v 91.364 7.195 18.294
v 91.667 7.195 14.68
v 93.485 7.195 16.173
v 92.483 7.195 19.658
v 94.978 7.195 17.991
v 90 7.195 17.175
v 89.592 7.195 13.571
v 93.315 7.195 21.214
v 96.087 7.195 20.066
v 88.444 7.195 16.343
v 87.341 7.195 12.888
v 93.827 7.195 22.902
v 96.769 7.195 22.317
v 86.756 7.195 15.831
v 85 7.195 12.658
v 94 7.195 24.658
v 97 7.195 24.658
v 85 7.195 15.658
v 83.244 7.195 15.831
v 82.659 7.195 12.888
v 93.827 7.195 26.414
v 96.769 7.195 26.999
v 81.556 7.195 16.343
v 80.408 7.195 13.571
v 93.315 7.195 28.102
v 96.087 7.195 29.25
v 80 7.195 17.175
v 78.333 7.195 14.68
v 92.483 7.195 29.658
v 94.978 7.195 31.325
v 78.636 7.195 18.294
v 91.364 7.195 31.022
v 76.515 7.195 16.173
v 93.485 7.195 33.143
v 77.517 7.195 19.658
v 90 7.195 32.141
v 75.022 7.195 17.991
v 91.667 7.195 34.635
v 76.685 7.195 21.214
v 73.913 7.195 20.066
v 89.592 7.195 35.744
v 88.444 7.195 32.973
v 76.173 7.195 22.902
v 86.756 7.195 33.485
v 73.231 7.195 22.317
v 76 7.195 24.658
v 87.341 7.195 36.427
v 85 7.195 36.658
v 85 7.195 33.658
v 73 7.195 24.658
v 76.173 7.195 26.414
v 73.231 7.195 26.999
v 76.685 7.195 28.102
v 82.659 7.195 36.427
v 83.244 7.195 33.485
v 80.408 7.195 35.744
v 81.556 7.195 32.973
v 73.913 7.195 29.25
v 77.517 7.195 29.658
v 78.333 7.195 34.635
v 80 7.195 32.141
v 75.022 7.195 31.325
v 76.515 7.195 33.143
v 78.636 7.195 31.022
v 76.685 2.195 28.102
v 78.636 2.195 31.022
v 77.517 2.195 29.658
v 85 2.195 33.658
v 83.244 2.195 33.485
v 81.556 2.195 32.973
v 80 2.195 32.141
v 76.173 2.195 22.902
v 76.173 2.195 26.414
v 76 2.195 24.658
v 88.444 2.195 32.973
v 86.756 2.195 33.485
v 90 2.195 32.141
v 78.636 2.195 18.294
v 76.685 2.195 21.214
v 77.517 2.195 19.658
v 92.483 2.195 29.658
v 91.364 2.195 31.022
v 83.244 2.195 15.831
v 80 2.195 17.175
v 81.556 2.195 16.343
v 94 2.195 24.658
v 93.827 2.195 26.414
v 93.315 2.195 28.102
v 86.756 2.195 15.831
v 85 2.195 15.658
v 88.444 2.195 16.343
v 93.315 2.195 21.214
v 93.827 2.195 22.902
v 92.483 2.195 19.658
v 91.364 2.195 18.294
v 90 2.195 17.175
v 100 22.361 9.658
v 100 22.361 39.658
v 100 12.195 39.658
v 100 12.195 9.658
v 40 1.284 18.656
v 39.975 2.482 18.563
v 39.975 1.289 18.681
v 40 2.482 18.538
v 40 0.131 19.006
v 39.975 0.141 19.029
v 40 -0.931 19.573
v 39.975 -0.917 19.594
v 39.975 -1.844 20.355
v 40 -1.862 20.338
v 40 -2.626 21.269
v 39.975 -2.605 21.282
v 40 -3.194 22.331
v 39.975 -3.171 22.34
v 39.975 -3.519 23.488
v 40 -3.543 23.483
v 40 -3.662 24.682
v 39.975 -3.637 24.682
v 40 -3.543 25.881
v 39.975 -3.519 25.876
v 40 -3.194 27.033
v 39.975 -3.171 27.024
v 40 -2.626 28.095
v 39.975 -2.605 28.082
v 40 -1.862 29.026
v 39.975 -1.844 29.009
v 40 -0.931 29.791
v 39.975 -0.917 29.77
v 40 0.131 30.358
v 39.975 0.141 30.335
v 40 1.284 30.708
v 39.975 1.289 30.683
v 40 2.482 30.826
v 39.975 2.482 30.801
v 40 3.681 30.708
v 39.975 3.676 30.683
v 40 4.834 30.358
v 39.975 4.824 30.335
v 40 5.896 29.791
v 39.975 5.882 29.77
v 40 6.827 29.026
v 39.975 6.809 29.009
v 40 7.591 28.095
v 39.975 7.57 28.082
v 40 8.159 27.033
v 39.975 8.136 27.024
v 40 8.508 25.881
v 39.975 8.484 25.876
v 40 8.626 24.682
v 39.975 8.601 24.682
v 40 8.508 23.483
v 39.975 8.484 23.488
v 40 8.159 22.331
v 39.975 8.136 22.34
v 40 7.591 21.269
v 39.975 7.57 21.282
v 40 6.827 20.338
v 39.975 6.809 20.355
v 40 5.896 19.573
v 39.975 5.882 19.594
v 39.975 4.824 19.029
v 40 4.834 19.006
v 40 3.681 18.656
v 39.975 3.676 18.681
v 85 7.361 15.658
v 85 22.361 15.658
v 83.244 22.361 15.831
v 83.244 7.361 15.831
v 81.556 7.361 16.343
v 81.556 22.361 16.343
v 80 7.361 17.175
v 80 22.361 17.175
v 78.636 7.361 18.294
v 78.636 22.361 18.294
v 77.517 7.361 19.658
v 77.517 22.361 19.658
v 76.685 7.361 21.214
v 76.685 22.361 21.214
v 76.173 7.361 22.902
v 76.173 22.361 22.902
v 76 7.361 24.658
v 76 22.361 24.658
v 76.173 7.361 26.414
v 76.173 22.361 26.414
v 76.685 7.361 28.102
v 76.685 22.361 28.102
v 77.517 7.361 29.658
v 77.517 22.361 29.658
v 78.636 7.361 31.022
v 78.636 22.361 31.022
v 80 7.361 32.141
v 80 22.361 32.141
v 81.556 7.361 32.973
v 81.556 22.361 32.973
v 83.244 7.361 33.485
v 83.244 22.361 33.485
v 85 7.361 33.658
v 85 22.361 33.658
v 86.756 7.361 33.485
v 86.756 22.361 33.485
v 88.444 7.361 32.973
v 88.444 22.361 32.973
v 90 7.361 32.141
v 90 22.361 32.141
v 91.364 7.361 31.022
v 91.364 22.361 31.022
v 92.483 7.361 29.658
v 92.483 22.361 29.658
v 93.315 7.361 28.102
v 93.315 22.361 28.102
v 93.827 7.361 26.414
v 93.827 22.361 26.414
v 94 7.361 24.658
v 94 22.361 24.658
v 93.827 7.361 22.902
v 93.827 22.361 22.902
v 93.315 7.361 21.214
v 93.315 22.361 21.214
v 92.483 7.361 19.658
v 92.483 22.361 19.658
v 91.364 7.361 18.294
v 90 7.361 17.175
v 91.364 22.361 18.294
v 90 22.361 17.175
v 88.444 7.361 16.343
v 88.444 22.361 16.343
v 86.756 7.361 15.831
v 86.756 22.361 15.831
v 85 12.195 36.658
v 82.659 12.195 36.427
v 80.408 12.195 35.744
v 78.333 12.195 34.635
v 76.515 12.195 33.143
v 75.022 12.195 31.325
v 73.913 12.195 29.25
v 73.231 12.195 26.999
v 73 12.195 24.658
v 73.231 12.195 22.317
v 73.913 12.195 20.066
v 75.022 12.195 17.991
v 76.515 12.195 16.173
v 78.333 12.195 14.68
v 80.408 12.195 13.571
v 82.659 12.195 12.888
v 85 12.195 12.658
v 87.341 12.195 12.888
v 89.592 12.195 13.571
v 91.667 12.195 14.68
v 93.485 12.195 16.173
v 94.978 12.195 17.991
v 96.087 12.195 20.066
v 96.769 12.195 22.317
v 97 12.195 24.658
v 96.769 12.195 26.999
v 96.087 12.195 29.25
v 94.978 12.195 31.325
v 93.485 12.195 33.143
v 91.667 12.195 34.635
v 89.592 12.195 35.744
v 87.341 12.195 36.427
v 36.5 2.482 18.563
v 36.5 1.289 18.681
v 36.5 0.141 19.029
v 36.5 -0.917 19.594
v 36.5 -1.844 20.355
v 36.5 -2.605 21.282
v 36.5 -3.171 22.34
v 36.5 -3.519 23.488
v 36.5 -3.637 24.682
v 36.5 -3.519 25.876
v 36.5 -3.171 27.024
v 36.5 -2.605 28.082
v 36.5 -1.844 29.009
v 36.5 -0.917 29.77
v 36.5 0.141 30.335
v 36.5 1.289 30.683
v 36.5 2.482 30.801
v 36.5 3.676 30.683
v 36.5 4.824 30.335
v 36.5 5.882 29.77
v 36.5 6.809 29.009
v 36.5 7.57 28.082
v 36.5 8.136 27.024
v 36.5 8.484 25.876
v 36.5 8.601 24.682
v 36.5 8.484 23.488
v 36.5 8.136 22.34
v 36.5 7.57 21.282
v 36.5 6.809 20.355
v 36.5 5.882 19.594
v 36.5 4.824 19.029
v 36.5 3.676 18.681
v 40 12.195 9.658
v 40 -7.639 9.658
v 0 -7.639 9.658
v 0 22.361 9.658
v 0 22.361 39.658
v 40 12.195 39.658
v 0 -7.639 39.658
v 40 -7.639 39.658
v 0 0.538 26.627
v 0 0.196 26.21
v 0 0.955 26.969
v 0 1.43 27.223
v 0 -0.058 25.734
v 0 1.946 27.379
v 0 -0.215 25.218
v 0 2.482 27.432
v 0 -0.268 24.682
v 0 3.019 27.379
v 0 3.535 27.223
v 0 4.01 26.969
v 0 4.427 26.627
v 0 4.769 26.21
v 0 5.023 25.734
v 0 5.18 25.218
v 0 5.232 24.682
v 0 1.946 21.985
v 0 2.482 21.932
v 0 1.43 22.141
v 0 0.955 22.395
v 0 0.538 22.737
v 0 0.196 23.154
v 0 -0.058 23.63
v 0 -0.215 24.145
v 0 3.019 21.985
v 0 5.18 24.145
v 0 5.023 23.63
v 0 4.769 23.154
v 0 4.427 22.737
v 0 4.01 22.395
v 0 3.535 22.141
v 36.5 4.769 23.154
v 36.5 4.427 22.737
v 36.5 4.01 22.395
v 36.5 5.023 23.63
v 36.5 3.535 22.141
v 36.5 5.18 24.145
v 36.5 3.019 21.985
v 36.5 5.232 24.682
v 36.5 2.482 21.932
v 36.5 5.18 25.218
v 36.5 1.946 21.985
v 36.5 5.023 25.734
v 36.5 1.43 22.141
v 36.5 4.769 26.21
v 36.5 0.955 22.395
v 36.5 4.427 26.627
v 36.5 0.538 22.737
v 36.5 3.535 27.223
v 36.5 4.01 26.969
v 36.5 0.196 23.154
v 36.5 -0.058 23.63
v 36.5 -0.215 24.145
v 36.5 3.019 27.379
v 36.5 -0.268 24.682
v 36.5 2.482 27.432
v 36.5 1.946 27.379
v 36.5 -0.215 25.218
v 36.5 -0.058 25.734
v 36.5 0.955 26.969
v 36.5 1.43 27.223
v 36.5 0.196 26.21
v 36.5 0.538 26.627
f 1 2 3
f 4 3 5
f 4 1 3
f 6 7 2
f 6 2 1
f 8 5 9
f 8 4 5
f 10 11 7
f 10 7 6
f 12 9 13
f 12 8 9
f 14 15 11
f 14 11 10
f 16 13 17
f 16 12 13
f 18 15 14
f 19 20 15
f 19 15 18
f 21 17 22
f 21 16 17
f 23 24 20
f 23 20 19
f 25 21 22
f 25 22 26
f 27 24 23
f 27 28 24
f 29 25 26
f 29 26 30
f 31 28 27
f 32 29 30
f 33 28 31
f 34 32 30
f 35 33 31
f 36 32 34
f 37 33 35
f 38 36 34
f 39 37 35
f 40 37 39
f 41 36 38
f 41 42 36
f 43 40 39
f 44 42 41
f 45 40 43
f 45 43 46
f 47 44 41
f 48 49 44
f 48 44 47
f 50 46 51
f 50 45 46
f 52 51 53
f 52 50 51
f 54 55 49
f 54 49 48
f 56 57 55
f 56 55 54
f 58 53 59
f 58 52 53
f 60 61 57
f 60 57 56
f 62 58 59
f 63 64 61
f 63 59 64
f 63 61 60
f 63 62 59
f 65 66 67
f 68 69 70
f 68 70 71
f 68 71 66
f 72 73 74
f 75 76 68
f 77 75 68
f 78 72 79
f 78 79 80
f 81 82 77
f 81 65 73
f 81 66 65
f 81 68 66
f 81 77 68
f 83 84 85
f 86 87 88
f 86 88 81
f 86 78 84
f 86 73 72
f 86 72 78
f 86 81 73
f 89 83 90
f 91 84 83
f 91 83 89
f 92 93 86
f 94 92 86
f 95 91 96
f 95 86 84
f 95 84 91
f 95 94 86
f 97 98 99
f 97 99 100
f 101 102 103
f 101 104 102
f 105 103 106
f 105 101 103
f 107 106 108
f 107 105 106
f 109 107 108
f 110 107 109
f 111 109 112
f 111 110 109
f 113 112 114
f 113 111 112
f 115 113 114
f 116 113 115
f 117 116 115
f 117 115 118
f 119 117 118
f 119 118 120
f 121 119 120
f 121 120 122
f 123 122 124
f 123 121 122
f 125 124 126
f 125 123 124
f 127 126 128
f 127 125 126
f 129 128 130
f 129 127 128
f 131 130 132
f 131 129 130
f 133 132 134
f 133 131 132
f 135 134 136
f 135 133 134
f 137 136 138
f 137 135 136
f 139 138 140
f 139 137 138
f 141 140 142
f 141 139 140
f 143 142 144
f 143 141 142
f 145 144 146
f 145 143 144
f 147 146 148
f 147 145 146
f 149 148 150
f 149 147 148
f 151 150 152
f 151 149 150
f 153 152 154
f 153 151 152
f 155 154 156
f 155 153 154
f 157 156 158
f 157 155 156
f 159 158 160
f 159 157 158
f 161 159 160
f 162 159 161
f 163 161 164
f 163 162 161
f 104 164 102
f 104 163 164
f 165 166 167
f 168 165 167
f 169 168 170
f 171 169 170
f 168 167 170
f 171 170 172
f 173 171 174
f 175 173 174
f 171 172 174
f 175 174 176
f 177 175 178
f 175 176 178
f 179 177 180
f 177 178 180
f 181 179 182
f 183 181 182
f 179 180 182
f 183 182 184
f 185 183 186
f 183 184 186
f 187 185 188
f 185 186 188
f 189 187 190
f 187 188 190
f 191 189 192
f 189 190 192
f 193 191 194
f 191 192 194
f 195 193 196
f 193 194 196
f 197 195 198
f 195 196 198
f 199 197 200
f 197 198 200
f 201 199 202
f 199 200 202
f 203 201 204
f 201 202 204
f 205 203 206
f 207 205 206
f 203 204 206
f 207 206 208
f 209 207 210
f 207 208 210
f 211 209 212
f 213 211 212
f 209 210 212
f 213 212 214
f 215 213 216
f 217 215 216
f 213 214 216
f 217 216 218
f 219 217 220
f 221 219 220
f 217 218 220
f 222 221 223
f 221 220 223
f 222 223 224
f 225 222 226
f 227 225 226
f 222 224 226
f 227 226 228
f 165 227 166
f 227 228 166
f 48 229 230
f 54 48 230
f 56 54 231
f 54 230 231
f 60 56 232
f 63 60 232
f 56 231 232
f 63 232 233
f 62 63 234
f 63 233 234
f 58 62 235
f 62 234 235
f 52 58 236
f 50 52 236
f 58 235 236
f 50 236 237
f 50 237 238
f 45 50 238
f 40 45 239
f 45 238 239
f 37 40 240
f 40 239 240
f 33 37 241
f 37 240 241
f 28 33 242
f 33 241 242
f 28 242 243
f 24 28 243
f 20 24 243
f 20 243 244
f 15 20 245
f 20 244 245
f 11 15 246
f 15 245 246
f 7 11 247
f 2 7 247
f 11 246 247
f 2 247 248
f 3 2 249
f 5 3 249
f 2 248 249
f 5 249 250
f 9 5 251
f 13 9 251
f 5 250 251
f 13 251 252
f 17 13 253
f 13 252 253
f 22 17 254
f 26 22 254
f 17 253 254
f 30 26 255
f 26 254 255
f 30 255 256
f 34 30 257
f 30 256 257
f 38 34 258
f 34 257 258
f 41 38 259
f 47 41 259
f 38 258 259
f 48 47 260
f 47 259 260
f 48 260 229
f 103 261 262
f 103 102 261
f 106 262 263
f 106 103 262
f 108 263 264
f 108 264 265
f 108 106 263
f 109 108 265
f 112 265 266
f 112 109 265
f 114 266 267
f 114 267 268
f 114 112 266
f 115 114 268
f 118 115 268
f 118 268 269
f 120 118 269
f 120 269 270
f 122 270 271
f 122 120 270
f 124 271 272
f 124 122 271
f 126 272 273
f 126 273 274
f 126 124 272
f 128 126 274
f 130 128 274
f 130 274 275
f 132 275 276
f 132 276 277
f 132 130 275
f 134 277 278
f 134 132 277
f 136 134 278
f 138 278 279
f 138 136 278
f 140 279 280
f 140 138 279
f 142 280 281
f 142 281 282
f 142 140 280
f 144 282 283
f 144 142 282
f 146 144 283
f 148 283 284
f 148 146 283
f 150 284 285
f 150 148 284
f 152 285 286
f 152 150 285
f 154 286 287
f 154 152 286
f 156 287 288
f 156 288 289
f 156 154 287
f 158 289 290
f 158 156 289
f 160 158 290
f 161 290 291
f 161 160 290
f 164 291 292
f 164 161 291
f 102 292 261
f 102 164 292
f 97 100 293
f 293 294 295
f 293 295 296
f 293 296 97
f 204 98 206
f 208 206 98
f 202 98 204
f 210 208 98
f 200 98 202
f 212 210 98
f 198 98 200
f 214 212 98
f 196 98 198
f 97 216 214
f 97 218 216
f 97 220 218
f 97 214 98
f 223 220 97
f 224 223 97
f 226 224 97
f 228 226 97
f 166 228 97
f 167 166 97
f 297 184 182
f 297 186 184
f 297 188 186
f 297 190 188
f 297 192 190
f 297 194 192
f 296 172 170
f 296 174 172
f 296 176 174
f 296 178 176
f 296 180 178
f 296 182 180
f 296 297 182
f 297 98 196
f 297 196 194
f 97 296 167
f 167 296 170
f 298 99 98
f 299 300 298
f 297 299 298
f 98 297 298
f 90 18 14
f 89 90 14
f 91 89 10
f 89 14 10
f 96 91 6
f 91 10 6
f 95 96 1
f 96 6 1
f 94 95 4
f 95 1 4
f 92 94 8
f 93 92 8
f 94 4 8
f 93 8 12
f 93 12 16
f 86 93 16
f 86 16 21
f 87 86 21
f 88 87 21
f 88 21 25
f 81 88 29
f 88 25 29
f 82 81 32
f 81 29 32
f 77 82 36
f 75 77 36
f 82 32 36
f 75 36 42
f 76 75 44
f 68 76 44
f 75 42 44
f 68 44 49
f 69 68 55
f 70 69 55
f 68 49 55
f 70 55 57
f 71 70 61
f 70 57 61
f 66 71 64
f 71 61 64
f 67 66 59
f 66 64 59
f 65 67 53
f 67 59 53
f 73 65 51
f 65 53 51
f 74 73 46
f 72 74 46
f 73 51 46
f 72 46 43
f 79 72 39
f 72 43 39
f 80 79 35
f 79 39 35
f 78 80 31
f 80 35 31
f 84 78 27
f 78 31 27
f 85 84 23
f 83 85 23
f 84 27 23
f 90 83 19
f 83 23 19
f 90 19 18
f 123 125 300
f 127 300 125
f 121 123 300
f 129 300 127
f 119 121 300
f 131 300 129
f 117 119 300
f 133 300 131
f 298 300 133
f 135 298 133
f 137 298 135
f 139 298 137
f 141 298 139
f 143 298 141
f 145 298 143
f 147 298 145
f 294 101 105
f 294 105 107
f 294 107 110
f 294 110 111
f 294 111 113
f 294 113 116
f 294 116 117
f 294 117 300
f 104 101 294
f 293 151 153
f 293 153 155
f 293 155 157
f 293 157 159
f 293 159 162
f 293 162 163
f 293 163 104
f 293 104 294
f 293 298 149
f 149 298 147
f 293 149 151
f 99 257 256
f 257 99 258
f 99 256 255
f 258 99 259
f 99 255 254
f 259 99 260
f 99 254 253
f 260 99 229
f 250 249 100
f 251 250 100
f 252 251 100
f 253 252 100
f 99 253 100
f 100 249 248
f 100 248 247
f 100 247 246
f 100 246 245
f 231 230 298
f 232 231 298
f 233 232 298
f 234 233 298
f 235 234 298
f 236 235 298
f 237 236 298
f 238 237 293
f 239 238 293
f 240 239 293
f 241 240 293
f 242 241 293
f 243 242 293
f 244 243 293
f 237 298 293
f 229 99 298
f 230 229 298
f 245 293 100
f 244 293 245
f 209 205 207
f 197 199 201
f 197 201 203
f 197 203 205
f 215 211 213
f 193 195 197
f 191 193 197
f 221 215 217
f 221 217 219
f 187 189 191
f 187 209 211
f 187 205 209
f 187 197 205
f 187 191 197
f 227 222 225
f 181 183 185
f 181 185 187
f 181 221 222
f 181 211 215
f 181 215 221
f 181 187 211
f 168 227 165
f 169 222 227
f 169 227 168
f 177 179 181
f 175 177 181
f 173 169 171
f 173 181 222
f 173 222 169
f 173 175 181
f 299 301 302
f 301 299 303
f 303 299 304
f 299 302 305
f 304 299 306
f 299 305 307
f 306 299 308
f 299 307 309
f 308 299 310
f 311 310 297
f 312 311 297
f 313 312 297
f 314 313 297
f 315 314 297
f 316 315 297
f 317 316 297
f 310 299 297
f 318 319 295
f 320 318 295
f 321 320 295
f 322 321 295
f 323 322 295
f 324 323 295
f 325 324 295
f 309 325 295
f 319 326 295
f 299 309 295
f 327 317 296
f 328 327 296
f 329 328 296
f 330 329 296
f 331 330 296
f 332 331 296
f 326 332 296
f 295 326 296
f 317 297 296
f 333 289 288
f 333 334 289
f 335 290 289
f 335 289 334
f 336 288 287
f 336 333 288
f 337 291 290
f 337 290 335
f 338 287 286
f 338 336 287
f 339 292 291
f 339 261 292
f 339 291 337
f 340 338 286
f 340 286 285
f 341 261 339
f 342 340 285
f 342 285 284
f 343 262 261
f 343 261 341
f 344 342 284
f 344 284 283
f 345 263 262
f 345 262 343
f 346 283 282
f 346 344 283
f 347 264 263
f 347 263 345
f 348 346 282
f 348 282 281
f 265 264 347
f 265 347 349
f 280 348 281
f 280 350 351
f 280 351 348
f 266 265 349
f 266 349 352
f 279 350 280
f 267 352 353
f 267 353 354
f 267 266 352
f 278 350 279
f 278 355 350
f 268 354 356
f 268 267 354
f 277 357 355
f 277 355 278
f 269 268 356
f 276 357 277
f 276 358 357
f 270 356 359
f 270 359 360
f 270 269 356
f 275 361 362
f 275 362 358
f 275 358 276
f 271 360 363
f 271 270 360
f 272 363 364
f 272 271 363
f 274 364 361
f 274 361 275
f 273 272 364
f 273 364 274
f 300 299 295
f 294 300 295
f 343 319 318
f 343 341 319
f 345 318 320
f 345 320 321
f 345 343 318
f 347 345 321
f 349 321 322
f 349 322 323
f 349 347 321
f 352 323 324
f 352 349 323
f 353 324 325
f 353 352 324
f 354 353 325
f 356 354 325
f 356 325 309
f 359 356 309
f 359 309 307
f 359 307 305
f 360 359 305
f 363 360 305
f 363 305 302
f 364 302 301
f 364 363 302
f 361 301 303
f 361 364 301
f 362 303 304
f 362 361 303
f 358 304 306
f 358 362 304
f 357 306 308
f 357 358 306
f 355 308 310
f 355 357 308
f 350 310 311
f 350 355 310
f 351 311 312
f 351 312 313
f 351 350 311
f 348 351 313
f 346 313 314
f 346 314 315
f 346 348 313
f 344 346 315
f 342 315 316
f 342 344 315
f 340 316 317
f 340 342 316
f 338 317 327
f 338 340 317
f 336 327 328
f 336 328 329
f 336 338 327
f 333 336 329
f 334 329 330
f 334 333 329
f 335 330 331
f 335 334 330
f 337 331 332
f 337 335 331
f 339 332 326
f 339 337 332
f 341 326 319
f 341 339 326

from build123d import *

# Parameters (mm, degrees)
SKETCH_1_W          = 30
SKETCH_1_H          = 30
EXTRUDE_1_DEPTH     = 40
SKETCH_2_W          = 30
SKETCH_2_H          = 10.165772452
EXTRUDE_2_DEPTH     = 60
SKETCH_3_R          = 12
EXTRUDE_3_DEPTH     = 5
SKETCH_4_R          = 9
EXTRUDE_4_DEPTH     = 5
SKETCH_16_R         = 9
CUT_EXTRUDE_1_DEPTH = 15


with BuildPart() as part:
    # Эскиз1 → Бобышка-Вытянуть1 (new body)
    with BuildSketch(Plane(origin=(0, 0, 0), x_dir=(0, 0, -1), z_dir=(1, 0, 0))):
        with Locations((-24.657846844, 7.360988518)):
            Rectangle(SKETCH_1_W, SKETCH_1_H)
    extrude(amount=EXTRUDE_1_DEPTH)

    # Эскиз2 → Бобышка-Вытянуть2 (add)
    with BuildSketch(Plane(origin=(40, 0, 0), x_dir=(0, 0, -1), z_dir=(1, 0, 0))):
        with Locations((-24.657846844, 17.278102292)):
            Rectangle(SKETCH_2_W, SKETCH_2_H)
    extrude(amount=EXTRUDE_2_DEPTH)

    # Эскиз3 → Бобышка-Вытянуть3 (add)
    with BuildSketch(Plane.XZ.offset(-12.195216066)):
        with Locations(Location((85, 24.657846844, 0), (0, 0, 90))):
            Circle(SKETCH_3_R)
    extrude(amount=EXTRUDE_3_DEPTH)

    # Эскиз4 → Бобышка-Вытянуть4 (add)
    with BuildSketch(Plane.XZ.offset(-7.195216066)):
        with Locations(Location((85, 24.657846844, 0), (0, 0, 270))):
            Circle(SKETCH_4_R)
    extrude(amount=EXTRUDE_4_DEPTH)

    # Эскиз13 → Цековка для  болта с шестигранной головкой M51 (revolve, cut)
    with BuildSketch(Plane(origin=(40, 2.482471753, 24.681970174), x_dir=(0, 0, -1), z_dir=(0, 1, 0))):
        Polygon((0, 0), (0, 40), (2.75, 40), (2.75, 3.5), (6.119, 3.5), (6.119, 0.025), (6.144, 0), align=None)
    revolve(axis=Axis((46.35, 2.482471753, 24.681970174), (-1, 0, 0)), mode=Mode.SUBTRACT)

    # Эскиз16 → Вырез-Вытянуть1 (cut)
    with BuildSketch(Plane(origin=(0, 22.360988518, 0), x_dir=(1, 0, 0), z_dir=(0, 1, 0))):
        with Locations(Location((85, -24.657846844, 0), (0, 0, 90))):
            Circle(SKETCH_16_R)
    extrude(amount=-CUT_EXTRUDE_1_DEPTH, mode=Mode.SUBTRACT)


solid = part.part
